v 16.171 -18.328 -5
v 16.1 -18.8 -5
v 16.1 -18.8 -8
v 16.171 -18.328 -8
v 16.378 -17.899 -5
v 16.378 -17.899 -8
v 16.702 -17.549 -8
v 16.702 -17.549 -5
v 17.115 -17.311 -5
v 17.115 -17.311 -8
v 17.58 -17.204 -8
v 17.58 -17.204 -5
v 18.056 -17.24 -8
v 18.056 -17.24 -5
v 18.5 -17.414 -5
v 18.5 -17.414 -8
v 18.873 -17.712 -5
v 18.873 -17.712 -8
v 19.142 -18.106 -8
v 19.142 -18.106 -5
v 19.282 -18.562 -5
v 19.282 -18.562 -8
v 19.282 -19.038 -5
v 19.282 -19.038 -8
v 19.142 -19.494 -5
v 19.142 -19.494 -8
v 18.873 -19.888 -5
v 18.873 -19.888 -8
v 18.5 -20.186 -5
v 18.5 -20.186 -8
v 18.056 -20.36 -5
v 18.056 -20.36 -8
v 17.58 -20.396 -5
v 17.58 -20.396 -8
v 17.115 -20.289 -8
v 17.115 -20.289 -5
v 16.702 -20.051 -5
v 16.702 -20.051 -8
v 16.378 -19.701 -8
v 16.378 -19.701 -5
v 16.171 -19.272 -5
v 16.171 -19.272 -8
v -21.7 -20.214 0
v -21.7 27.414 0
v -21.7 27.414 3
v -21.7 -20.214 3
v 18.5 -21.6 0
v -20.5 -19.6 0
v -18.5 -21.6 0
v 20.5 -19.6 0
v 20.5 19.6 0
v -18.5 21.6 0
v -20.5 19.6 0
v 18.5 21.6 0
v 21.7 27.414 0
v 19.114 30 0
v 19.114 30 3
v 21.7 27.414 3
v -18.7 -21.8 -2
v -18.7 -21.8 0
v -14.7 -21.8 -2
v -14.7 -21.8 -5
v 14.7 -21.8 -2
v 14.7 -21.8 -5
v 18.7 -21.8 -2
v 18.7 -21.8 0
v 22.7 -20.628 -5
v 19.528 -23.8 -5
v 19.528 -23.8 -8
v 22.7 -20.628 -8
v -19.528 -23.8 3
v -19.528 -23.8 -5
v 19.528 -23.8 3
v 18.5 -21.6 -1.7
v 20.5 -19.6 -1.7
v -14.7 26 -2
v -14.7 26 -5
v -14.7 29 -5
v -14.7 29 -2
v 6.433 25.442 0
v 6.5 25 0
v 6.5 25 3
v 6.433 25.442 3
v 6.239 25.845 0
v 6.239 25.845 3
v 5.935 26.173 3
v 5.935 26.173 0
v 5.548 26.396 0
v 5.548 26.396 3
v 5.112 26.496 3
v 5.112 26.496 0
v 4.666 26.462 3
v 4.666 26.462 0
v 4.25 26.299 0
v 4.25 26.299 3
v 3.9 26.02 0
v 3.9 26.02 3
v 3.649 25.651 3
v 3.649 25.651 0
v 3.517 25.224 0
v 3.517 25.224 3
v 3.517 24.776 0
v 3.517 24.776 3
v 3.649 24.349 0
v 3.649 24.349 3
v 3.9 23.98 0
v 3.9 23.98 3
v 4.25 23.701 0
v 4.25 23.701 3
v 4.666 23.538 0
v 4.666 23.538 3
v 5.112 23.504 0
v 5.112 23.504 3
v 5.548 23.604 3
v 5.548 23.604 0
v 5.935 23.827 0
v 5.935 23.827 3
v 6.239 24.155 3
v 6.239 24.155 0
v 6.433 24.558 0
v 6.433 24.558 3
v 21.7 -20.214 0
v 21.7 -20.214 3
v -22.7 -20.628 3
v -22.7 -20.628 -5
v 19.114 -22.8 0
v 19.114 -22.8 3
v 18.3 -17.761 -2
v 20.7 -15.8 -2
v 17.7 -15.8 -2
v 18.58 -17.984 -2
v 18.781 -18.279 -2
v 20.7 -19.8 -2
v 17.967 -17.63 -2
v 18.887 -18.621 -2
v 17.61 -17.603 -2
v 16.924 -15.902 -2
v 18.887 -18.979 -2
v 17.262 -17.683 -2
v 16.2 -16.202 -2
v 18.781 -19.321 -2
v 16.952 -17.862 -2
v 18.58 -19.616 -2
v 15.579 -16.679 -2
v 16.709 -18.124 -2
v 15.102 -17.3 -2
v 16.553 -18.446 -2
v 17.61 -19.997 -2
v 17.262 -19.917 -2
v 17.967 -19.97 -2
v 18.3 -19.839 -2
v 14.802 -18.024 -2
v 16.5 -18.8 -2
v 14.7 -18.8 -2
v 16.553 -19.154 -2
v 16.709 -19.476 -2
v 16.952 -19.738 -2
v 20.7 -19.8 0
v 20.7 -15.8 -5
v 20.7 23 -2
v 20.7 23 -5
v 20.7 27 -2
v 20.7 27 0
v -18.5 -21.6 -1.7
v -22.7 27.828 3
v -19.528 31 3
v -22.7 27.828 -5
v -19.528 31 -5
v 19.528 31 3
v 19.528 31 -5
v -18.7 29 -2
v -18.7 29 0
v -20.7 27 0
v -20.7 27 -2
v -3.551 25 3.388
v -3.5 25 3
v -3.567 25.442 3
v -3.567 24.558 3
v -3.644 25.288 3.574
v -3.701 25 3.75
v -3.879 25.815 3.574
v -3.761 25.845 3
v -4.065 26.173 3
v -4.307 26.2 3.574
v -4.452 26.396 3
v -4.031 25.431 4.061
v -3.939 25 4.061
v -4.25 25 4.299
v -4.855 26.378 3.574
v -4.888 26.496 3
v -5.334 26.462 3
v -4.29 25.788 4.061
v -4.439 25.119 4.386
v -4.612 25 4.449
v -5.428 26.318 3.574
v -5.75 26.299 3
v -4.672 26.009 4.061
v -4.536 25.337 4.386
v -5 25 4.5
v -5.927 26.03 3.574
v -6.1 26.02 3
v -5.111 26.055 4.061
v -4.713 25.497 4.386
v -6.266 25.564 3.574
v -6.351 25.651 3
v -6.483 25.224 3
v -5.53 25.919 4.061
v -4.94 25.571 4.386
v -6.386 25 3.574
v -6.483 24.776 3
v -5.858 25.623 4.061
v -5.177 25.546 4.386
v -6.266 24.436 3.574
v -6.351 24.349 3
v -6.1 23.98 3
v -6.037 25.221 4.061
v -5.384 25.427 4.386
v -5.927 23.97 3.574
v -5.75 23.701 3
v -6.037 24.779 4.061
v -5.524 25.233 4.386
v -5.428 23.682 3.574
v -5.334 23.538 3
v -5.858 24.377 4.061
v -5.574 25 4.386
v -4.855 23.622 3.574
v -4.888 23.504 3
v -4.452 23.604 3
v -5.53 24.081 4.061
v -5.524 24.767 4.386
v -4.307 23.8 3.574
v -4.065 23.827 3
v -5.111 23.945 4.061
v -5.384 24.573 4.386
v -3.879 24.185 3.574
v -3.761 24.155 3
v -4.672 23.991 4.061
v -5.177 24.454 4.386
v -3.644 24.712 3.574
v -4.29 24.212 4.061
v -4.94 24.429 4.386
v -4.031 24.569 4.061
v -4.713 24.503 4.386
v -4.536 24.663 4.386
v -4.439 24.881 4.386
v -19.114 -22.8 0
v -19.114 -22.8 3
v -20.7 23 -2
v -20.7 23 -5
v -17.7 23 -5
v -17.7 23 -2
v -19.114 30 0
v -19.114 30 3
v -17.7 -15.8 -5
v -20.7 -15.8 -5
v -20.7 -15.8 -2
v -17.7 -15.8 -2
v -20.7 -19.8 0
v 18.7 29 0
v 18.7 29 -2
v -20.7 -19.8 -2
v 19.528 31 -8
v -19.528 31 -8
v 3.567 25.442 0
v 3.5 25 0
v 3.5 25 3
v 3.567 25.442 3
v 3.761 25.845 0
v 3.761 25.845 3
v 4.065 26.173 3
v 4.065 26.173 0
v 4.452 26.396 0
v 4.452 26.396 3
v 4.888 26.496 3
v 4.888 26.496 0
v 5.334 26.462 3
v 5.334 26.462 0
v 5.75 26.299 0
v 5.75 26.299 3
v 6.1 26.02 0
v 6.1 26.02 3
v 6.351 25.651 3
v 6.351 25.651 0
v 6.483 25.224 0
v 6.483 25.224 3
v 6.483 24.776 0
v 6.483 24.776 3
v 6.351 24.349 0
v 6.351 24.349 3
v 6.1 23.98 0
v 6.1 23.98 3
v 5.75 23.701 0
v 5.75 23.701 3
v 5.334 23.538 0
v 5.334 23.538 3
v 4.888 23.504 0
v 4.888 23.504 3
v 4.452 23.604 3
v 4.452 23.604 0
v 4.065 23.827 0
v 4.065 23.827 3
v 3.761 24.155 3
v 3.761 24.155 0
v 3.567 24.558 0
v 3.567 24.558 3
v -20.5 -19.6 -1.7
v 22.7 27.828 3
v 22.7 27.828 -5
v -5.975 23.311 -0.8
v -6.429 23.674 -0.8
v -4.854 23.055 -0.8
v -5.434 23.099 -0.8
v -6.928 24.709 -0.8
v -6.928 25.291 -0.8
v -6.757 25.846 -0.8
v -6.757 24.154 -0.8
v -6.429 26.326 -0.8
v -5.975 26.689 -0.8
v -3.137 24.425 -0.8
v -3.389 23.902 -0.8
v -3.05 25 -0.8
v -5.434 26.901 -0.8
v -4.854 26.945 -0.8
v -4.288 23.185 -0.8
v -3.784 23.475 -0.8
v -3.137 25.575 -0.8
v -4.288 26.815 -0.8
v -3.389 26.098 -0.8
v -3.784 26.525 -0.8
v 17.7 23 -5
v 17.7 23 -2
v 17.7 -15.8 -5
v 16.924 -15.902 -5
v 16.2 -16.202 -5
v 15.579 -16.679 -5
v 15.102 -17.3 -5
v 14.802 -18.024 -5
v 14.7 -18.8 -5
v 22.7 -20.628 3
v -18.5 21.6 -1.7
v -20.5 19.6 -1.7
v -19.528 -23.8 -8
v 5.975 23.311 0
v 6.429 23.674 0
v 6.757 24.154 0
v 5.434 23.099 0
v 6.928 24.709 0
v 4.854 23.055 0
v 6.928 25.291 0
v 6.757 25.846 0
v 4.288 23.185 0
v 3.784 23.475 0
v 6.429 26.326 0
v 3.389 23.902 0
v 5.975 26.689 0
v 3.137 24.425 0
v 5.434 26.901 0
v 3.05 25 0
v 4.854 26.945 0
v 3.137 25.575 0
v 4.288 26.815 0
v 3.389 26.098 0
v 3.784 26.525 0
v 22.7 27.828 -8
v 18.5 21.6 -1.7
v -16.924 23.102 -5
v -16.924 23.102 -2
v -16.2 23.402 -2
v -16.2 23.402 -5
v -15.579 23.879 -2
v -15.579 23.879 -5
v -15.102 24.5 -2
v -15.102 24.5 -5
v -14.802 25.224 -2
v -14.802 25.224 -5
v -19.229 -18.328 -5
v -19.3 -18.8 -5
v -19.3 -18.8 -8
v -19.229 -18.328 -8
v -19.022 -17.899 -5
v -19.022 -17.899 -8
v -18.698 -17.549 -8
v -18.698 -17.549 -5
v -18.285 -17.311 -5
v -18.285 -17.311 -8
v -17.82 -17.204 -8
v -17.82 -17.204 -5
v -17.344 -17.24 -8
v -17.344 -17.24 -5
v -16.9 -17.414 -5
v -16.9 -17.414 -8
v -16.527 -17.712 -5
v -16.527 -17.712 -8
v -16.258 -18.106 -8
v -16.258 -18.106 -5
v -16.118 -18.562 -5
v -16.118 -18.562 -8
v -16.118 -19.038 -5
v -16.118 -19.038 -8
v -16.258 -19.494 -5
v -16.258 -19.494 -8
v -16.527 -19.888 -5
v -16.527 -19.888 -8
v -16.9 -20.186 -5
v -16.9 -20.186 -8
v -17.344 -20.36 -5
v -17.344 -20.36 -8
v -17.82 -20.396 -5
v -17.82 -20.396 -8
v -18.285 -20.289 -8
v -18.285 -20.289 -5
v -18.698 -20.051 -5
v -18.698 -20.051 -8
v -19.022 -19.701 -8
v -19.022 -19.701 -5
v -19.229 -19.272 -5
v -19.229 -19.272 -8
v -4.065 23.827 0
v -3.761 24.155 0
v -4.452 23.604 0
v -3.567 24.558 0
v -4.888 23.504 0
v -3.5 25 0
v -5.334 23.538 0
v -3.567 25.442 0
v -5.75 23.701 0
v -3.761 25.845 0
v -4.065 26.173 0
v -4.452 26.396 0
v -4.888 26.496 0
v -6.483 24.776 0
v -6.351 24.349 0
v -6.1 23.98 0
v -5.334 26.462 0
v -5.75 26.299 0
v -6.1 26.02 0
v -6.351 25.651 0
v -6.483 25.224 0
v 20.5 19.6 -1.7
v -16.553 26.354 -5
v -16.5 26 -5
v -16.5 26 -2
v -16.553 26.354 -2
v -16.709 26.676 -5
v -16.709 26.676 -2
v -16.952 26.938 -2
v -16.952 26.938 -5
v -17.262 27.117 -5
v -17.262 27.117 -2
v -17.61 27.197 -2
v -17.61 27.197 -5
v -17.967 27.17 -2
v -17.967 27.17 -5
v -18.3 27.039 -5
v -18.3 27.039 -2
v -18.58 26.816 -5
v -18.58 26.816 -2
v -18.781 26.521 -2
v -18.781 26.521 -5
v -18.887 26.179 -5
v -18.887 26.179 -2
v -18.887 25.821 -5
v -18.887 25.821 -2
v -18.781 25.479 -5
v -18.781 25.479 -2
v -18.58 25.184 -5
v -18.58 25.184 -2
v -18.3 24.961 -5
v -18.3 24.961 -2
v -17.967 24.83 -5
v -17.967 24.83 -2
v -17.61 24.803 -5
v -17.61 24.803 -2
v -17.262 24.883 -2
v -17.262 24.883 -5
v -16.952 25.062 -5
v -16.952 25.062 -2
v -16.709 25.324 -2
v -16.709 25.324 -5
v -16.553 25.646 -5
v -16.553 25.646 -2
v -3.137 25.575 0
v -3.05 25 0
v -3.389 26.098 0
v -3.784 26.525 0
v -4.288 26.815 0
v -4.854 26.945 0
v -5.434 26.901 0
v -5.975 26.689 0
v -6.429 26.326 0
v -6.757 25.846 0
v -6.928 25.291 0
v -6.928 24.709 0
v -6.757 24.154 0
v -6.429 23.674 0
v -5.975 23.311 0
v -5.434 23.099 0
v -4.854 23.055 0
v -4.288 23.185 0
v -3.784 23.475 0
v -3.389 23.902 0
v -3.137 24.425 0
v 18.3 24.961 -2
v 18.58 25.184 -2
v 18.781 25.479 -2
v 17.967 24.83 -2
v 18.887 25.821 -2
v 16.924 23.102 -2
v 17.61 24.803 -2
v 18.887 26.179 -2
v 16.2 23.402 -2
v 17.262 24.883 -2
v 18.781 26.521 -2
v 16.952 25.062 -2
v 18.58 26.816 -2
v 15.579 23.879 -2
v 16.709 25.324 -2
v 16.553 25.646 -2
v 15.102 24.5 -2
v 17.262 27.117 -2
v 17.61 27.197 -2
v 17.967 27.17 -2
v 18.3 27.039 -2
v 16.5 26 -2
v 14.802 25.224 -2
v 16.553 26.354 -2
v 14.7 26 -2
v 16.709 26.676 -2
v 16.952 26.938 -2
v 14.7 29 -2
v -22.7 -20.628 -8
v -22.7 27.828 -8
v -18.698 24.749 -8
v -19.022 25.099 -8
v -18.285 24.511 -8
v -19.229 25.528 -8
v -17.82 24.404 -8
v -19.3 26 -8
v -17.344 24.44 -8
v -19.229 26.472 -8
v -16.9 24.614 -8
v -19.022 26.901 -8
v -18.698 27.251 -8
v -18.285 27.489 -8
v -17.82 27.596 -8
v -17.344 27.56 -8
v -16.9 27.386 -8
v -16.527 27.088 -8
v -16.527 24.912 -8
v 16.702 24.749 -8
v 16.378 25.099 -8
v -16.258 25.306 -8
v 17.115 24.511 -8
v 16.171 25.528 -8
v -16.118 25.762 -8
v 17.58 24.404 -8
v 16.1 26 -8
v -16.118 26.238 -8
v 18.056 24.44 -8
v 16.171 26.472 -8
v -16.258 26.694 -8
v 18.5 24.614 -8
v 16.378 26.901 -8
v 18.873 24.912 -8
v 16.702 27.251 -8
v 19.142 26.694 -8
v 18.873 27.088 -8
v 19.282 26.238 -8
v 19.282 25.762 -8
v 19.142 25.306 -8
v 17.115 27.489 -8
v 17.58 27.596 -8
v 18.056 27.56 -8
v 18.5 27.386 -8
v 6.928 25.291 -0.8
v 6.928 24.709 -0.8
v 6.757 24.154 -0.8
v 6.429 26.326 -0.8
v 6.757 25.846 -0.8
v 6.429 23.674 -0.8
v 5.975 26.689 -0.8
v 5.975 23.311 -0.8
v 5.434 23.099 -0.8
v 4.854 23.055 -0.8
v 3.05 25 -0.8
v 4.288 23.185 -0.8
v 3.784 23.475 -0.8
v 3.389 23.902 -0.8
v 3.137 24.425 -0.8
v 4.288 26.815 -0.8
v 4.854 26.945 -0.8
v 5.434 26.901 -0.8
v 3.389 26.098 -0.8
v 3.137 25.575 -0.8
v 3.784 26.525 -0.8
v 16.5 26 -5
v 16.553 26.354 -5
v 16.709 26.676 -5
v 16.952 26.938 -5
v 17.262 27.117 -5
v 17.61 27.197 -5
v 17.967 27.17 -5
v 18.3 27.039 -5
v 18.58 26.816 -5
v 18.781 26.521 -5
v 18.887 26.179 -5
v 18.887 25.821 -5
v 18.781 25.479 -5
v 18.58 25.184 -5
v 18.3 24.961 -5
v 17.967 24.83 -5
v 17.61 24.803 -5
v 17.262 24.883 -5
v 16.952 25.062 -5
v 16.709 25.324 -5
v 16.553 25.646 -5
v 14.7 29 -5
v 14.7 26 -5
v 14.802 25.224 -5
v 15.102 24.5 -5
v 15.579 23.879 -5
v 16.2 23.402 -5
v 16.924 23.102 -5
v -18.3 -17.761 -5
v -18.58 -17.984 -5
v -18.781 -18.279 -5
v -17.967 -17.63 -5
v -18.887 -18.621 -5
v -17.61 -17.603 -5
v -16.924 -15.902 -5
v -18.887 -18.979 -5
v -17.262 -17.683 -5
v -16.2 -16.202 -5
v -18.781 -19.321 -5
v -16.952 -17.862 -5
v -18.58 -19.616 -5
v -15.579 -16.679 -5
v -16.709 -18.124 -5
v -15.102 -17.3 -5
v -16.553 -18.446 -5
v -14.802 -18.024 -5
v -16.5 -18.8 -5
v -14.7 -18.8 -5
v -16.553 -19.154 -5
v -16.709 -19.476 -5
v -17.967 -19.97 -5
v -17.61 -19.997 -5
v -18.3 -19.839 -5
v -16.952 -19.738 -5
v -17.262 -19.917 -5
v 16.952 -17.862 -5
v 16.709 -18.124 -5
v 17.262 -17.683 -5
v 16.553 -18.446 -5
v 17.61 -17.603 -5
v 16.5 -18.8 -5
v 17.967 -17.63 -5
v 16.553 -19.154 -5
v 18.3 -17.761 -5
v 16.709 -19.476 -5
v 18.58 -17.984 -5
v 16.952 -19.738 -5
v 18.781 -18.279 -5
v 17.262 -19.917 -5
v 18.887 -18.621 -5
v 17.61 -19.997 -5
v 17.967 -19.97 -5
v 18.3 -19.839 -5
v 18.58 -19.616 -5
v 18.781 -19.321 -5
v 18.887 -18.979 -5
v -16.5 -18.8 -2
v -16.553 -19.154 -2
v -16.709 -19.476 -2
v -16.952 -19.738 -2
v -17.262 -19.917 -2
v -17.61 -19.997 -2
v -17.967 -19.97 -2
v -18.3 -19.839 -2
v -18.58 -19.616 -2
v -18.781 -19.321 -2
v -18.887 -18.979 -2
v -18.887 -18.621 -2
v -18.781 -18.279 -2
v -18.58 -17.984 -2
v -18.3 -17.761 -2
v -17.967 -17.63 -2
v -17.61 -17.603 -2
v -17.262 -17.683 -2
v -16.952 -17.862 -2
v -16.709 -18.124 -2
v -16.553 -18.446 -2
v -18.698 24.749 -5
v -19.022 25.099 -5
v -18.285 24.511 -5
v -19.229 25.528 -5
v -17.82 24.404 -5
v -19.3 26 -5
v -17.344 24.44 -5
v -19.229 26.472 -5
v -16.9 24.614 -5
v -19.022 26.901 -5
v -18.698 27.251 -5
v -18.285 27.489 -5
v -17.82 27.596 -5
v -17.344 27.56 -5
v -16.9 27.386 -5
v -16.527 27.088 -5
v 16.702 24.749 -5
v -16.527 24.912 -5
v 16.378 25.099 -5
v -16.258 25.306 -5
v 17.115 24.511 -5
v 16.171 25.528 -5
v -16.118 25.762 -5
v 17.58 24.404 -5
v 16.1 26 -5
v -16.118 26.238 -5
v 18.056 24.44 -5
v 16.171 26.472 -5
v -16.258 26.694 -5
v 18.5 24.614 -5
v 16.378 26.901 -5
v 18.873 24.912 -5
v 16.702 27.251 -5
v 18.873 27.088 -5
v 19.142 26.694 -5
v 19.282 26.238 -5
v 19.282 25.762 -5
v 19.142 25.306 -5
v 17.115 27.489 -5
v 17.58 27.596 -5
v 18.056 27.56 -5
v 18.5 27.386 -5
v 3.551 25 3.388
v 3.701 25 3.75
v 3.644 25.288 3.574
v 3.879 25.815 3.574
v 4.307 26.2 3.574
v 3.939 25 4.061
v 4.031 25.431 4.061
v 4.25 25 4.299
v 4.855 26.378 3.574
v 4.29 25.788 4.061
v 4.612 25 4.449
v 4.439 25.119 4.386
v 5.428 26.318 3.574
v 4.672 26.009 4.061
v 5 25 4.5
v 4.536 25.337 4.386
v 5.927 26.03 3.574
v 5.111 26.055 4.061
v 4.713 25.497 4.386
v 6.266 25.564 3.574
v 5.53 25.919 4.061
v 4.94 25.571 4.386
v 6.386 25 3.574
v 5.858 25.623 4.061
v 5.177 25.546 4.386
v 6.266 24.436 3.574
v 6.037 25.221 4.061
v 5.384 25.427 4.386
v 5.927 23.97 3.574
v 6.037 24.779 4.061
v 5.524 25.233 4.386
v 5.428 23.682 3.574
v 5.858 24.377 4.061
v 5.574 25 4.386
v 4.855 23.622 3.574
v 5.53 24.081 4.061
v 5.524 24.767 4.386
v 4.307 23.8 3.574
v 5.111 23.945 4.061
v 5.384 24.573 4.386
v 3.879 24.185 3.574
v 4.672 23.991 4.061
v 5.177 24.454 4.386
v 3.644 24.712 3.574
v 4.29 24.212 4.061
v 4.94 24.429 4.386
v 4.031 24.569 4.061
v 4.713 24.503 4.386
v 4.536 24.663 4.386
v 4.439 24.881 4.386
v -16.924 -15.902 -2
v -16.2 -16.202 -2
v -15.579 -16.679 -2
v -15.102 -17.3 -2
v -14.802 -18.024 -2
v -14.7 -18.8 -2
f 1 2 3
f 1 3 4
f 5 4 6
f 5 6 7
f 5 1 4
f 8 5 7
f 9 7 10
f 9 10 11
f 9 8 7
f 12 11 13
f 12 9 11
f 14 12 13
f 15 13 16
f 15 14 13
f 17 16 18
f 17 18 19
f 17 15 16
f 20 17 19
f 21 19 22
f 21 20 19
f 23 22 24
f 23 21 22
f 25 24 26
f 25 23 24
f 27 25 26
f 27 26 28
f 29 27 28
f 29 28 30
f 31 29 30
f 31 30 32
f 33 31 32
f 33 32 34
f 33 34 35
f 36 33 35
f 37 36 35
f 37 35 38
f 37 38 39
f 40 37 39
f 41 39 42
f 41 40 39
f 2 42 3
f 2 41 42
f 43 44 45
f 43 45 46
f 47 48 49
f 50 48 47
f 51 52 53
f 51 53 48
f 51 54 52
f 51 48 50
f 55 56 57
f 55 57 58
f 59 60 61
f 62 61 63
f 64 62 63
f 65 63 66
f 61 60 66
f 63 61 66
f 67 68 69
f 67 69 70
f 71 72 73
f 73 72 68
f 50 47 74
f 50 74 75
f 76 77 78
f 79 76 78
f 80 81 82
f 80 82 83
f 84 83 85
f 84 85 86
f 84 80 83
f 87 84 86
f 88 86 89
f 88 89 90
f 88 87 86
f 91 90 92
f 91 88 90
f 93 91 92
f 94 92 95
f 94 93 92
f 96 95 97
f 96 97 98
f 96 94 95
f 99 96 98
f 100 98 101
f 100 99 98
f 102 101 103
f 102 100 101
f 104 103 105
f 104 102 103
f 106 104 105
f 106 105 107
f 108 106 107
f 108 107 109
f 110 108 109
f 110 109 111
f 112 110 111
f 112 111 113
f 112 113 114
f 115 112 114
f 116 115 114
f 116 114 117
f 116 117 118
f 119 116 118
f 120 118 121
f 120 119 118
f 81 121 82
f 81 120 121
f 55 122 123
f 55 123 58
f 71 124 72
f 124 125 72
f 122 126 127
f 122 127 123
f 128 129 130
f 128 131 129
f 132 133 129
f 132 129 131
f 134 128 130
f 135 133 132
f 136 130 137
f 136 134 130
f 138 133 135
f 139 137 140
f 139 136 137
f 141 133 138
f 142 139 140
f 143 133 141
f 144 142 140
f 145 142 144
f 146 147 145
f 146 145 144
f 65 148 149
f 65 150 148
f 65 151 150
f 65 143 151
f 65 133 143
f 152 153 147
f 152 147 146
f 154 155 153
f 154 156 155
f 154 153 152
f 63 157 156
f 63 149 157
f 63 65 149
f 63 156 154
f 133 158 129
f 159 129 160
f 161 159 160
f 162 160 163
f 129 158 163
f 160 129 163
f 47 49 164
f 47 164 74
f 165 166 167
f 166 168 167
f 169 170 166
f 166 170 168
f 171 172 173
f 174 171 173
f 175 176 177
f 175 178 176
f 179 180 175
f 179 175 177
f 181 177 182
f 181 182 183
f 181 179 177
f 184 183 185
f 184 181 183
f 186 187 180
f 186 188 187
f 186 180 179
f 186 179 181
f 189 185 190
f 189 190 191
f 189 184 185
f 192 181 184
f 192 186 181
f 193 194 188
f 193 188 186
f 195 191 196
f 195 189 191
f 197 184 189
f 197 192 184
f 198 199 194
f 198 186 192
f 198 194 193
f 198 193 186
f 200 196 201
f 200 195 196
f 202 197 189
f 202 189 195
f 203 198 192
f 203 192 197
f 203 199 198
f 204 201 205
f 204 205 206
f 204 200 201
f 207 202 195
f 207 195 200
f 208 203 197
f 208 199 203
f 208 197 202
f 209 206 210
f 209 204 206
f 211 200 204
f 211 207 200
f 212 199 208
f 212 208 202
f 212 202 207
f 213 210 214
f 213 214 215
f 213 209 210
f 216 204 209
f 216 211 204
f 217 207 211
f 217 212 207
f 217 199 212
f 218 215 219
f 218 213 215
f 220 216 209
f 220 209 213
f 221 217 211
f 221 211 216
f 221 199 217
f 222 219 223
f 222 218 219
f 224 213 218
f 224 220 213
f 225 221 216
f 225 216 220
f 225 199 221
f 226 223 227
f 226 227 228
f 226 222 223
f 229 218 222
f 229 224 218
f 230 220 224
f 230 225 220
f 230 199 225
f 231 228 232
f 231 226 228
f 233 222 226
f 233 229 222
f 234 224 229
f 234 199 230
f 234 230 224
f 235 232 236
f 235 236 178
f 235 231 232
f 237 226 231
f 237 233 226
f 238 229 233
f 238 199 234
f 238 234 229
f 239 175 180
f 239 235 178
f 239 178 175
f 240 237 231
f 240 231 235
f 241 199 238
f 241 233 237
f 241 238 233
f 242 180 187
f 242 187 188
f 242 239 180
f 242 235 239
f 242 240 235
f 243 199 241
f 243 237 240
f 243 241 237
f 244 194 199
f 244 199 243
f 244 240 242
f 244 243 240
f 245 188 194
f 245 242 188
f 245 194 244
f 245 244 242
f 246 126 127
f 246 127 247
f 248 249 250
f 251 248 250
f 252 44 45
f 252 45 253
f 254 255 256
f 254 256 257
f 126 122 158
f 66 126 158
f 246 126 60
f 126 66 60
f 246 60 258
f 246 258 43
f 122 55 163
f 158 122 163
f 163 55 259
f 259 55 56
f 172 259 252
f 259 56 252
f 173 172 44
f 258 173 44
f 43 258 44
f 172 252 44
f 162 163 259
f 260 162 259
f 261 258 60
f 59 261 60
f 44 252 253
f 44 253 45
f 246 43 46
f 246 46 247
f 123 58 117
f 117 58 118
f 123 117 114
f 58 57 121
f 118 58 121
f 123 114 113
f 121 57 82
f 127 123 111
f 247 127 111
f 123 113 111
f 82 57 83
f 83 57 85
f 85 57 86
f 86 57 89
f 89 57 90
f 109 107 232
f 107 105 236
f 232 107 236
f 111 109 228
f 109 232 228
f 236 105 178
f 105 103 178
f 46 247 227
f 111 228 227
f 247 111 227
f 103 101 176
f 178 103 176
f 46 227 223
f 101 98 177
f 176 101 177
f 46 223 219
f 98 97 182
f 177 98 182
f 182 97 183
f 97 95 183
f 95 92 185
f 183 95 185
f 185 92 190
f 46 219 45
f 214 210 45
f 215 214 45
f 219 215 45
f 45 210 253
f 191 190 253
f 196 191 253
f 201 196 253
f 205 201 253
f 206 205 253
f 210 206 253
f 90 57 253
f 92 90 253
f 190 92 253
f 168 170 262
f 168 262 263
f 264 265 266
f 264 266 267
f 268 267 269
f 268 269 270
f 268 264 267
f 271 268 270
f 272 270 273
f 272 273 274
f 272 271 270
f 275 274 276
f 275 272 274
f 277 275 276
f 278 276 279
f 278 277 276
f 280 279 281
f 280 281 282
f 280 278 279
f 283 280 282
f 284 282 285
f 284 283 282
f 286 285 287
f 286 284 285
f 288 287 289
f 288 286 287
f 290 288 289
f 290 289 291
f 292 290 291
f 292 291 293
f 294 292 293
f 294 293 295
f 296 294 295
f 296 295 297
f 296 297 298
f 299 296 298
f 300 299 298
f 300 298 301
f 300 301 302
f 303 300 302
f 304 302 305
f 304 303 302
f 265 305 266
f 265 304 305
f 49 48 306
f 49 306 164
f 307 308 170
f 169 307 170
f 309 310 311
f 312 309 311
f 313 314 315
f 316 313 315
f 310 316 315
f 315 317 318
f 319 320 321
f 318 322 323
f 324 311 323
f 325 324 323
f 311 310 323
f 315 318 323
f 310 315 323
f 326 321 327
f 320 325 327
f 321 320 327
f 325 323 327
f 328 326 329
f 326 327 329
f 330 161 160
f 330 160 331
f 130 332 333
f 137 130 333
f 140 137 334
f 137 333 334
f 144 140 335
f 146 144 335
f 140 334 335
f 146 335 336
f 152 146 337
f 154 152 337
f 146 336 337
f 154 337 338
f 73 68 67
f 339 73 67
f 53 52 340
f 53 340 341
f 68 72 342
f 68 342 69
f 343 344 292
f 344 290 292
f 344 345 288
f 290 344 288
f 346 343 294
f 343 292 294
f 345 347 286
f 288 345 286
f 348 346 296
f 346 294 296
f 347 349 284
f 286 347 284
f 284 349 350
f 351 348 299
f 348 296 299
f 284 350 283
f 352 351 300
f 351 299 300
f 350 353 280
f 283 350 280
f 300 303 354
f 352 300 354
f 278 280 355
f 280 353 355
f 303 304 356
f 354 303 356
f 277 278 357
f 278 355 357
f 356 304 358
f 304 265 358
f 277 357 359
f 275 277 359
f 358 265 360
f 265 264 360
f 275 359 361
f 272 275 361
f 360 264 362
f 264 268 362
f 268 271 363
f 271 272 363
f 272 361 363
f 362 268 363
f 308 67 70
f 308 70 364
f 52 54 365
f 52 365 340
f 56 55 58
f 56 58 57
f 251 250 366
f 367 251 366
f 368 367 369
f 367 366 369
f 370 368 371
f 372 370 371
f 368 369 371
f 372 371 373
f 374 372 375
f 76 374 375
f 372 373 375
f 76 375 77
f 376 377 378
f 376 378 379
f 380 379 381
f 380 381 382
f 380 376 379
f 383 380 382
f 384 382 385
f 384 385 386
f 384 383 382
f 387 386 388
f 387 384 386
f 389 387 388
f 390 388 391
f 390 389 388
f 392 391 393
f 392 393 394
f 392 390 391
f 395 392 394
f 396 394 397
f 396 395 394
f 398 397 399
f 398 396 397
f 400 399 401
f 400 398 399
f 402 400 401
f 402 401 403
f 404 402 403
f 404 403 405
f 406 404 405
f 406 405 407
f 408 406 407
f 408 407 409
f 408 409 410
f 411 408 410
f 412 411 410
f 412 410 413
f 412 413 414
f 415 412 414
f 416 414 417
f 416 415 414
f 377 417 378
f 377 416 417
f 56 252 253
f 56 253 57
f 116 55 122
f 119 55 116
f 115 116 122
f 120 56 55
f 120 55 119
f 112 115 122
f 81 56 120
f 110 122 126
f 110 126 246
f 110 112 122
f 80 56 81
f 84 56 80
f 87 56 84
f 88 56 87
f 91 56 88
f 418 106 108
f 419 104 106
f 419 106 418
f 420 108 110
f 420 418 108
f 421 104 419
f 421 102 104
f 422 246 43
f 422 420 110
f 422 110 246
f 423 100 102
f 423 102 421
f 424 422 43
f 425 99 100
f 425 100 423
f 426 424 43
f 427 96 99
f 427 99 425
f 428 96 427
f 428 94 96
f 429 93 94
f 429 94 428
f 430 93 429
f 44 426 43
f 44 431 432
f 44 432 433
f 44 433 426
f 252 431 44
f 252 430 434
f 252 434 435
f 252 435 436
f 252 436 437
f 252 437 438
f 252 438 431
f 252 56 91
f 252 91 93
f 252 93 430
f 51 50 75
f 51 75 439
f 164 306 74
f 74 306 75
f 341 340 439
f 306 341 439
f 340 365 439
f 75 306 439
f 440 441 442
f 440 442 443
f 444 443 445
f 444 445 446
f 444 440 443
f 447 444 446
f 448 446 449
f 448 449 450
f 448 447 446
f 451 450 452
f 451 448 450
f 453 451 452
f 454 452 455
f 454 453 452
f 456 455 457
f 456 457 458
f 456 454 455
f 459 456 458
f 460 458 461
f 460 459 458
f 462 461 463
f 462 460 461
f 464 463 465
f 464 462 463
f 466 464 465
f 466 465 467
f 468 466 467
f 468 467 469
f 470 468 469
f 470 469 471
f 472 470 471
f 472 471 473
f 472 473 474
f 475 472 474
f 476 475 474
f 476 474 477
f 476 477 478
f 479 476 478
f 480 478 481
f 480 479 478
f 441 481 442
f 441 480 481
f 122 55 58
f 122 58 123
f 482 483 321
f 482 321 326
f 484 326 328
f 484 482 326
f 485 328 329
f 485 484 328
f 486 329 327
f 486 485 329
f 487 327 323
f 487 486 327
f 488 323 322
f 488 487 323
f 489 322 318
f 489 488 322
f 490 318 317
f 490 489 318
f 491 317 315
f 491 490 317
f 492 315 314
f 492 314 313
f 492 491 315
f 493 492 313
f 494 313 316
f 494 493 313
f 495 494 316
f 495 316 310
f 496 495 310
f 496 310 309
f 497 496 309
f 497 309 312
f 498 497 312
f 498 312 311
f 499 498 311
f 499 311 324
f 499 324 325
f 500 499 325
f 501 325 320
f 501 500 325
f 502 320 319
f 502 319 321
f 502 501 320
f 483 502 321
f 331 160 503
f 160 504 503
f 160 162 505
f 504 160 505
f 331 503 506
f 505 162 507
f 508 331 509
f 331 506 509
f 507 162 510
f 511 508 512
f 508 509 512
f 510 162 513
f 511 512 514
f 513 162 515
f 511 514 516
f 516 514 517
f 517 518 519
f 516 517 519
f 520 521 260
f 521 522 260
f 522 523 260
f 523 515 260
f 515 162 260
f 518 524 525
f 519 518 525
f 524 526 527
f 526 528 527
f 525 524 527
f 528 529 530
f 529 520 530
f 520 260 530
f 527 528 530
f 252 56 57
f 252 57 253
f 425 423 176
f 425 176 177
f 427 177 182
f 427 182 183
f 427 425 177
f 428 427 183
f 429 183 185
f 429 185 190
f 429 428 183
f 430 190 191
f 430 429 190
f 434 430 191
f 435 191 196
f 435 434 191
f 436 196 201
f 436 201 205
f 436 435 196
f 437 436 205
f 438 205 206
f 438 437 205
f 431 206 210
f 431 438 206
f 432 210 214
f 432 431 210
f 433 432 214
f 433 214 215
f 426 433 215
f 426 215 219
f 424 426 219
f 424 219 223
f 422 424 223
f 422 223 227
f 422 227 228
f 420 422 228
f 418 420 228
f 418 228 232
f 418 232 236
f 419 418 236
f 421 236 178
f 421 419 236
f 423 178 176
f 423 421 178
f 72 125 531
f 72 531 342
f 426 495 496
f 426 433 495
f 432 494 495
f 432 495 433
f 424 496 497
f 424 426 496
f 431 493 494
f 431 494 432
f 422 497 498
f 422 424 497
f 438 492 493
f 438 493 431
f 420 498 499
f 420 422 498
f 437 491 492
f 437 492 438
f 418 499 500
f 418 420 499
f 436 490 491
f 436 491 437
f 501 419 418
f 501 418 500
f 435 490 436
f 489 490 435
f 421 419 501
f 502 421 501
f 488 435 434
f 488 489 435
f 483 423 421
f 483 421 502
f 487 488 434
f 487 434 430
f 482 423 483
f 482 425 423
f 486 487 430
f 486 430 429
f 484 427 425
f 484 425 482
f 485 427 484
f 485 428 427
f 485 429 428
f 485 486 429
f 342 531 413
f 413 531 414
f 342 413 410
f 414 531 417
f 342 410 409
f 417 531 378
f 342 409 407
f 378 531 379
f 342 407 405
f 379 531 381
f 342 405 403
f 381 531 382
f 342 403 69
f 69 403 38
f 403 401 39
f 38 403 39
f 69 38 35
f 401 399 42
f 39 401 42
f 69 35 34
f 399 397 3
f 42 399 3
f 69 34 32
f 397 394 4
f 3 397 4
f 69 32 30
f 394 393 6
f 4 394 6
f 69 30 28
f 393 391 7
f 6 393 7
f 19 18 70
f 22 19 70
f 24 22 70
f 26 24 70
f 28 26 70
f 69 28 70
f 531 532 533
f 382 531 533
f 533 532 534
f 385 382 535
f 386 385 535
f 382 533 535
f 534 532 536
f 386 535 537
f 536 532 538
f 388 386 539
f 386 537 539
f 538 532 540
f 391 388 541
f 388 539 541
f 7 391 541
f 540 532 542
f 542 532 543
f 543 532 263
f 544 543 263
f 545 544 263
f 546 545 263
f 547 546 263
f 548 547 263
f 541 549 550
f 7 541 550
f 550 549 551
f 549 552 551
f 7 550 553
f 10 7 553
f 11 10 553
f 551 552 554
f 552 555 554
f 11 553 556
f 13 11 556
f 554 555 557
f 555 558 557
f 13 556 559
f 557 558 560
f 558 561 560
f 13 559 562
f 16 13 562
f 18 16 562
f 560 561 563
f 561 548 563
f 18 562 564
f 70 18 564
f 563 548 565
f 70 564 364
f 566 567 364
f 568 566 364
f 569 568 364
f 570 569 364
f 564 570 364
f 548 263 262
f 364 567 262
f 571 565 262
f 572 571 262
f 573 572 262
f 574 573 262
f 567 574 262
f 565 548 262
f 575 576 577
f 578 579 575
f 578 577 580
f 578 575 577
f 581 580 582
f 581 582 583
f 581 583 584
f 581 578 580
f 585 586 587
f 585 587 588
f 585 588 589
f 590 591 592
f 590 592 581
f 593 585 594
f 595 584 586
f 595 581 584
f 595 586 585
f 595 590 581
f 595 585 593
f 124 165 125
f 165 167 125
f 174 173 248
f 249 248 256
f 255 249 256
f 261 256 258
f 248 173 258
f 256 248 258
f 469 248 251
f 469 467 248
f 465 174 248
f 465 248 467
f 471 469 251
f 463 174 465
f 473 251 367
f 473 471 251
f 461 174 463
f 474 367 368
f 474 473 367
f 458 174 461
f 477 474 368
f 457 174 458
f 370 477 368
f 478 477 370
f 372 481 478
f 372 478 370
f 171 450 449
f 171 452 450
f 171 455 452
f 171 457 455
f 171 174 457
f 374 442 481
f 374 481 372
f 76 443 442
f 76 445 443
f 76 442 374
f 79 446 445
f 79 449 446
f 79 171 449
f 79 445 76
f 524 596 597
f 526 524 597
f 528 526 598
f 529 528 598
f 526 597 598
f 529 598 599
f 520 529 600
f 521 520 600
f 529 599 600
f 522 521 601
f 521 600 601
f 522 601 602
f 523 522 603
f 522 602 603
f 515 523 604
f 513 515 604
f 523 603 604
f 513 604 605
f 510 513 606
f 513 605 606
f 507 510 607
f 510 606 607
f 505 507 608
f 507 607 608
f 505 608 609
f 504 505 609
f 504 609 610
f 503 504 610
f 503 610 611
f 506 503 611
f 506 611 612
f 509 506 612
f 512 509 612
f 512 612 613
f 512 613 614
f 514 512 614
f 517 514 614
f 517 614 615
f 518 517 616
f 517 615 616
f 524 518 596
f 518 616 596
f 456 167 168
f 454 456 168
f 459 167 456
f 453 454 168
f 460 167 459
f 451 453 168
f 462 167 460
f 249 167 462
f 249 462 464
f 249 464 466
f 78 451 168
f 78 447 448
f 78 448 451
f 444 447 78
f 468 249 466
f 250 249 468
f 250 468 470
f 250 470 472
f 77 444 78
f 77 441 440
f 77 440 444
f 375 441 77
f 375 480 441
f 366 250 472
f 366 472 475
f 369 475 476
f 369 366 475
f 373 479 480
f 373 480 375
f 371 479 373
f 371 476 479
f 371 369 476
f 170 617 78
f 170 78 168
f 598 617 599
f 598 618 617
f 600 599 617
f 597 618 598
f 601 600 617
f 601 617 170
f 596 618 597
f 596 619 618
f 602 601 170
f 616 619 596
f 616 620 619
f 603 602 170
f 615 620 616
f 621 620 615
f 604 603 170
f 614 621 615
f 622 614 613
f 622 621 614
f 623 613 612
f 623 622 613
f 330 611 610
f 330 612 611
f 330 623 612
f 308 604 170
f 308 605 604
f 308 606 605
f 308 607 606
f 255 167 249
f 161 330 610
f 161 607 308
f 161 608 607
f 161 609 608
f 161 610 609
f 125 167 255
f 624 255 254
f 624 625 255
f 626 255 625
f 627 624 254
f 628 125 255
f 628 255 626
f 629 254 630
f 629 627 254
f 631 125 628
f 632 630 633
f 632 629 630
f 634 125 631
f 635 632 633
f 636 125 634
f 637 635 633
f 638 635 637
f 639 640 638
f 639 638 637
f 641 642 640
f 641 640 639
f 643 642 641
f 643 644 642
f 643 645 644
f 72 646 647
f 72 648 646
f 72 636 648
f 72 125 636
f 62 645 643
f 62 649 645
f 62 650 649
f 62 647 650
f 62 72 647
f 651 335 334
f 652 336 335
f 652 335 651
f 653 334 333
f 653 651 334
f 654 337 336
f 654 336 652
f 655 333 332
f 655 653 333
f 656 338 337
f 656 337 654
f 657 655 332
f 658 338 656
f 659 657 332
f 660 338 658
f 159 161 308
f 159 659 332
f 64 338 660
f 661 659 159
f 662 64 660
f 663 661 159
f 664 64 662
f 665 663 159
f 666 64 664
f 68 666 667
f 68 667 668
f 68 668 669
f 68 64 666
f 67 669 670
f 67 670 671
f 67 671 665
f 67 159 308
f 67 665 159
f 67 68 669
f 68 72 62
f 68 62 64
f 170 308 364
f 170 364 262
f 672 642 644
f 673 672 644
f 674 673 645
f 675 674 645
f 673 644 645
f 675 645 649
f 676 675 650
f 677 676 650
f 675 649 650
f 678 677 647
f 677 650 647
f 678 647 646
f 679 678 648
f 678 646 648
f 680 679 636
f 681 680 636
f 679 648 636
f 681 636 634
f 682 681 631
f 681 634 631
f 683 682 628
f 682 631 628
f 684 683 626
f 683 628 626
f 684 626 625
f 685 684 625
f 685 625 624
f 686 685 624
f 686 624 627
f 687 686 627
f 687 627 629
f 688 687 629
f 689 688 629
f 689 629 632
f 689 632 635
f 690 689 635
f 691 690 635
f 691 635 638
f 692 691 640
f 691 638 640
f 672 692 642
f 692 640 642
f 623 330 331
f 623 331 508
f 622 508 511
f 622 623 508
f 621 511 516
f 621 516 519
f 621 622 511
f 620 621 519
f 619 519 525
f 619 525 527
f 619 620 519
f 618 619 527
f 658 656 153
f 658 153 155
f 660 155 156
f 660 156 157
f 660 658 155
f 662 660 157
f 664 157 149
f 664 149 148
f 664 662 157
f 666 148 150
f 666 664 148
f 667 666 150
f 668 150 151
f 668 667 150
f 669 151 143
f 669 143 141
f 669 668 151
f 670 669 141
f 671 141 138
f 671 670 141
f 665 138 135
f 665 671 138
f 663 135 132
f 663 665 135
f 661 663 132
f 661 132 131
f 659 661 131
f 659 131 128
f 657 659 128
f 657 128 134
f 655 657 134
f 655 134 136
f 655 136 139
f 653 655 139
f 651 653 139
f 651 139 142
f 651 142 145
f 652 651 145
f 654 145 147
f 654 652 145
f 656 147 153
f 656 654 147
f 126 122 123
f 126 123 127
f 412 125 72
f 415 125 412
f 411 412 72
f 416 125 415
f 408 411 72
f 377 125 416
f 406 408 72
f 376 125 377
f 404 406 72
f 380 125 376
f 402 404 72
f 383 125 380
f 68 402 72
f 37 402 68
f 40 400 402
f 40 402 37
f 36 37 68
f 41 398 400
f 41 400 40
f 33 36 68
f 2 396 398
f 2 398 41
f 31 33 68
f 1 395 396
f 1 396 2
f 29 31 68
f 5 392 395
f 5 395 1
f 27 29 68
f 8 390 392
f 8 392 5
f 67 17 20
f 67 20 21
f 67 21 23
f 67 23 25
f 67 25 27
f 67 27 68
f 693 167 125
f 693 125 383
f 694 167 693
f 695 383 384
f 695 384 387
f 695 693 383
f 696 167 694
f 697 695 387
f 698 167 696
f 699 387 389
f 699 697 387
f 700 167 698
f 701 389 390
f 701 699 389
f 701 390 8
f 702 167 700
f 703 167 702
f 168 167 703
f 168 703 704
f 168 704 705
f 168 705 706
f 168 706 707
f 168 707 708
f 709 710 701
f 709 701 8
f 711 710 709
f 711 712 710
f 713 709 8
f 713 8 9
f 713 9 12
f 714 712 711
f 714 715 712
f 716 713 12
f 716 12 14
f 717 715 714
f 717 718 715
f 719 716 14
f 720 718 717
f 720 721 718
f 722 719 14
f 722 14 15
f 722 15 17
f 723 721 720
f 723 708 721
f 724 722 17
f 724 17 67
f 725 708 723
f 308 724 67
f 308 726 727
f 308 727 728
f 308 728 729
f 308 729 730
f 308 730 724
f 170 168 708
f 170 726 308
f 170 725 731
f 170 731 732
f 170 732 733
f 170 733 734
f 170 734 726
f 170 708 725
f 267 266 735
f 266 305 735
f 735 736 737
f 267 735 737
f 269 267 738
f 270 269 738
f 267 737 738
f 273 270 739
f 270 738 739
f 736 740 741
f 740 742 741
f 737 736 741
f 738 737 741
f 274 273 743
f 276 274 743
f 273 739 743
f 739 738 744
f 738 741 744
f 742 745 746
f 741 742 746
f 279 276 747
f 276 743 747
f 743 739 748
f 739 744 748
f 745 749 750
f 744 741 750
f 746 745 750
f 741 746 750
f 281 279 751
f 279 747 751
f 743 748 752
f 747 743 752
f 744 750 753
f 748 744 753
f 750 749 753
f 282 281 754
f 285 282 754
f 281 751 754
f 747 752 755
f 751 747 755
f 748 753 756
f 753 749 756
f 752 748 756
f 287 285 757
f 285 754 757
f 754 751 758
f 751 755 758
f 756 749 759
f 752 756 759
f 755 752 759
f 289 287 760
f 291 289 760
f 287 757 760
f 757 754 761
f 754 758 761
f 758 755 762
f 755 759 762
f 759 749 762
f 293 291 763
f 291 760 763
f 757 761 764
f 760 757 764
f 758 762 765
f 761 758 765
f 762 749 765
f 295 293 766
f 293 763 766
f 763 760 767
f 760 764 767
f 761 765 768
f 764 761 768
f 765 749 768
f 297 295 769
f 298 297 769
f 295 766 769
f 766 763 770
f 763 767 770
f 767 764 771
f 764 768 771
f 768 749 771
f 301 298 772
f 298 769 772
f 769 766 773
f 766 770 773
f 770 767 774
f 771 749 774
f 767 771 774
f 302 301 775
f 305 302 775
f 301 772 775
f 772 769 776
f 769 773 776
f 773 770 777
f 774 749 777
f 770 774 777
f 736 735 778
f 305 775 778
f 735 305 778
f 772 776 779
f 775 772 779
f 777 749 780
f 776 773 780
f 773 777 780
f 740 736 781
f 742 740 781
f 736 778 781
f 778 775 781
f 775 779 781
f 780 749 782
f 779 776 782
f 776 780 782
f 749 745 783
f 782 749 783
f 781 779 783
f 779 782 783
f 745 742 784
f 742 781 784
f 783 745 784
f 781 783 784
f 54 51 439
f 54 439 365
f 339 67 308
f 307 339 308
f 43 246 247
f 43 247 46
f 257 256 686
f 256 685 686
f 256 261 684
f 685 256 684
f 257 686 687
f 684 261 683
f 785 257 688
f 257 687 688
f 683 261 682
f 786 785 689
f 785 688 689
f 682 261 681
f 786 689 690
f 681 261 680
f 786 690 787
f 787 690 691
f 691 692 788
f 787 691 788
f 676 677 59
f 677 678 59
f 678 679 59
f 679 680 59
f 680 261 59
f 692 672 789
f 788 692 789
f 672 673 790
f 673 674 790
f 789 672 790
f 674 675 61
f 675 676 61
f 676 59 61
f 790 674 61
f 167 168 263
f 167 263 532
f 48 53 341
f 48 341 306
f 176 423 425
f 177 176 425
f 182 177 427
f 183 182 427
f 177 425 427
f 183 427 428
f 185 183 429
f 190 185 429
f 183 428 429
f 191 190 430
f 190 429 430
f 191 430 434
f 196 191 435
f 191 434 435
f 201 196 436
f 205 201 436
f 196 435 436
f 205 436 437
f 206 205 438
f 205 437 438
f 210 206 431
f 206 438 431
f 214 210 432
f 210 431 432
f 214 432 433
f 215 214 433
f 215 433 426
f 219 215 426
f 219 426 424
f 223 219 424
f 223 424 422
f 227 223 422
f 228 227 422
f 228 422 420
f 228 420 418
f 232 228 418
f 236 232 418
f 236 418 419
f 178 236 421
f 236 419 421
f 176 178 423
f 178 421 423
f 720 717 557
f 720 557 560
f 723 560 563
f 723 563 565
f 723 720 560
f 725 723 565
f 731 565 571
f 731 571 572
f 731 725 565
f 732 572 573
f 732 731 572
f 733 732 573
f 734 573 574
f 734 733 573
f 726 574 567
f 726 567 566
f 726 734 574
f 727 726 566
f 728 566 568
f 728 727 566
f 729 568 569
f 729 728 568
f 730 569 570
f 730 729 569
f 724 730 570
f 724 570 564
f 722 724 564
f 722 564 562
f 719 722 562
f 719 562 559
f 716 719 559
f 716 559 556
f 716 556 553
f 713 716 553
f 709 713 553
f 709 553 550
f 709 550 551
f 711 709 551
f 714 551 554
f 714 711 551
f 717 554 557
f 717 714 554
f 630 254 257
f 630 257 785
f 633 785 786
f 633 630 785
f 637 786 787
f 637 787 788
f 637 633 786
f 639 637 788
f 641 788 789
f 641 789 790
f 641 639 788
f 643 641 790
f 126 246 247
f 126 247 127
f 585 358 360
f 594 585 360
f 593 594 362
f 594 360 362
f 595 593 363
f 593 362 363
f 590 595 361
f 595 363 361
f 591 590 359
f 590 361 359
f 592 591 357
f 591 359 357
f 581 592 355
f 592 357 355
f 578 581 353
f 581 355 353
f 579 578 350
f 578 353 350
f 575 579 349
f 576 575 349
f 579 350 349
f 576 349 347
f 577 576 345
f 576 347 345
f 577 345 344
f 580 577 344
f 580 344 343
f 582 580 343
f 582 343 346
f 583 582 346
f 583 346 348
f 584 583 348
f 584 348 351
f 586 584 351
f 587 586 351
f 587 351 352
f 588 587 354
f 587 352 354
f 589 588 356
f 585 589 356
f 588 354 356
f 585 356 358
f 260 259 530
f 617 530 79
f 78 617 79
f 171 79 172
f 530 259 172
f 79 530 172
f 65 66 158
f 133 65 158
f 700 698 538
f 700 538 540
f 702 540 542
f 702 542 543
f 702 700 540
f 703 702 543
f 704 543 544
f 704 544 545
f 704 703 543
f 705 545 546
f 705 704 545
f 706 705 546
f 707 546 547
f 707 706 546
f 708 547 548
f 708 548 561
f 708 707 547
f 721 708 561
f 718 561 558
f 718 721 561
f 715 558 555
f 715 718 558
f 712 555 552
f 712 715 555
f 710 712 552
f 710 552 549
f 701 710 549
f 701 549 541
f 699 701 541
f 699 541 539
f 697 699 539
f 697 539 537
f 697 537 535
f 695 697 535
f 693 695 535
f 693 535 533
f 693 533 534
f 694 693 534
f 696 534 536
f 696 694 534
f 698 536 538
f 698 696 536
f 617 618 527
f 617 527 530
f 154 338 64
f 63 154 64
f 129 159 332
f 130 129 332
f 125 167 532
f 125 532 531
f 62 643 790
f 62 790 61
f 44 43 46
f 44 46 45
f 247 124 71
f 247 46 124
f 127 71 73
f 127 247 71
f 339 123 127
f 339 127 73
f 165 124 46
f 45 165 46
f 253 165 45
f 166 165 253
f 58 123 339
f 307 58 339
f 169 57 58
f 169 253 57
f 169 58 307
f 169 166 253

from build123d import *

# Parameters (mm, degrees)
BOSS_EXTRUDE1_DEPTH     = 1.7
SKETCH2_R               = 1.95
BOSS_EXTRUDE2_DEPTH     = 0.8
SKETCH4_R               = 1.5
BOSS_EXTRUDE3_DEPTH     = 4.5
FILLET1_R               = 1.5
BOSS_EXTRUDE4_DEPTH     = 5
BOSS_EXTRUDE5_DEPTH     = 3
SKETCH8_R               = 1.2
BOSS_EXTRUDE6_DEPTH     = 3
MIRROR2_COPY_1_SKETCH_R = 1.2
MIRROR2_COPY_1_DEPTH    = 3
SKETCH9_R               = 1.5
FRONT_DEPTH             = 3
SKETCH10_R              = 1.6
BACK_DEPTH              = 3


with BuildPart() as part:
    # Sketch1 → Boss-Extrude1 (new body)
    with BuildSketch(Plane.XY):
        Polygon((-18.5, 21.6), (-20.5, 19.6), (-20.5, -19.6), (-18.5, -21.6), (18.5, -21.6), (20.5, -19.6), (20.5, 19.6), (18.5, 21.6), align=None)
    extrude(amount=-BOSS_EXTRUDE1_DEPTH)


with BuildPart() as body_2:
    # Sketch2 → Boss-Extrude2 (new body)
    with BuildSketch(Plane.XY):
        with Locations((-5, 25)):
            Circle(SKETCH2_R)
    extrude(amount=-BOSS_EXTRUDE2_DEPTH)

    # Sketch4 → Boss-Extrude3 (add)
    with BuildSketch(Plane.XY):
        with Locations((-5, 25)):
            Circle(SKETCH4_R)
    extrude(amount=BOSS_EXTRUDE3_DEPTH)

    # Fillet1
    fillet1_edges = [body_2.edges().sort_by_distance(p)[0] for p in [
        (-6.5, 25, 4.5),
    ]]
    fillet(fillet1_edges, radius=FILLET1_R)


with BuildPart() as body_3:
    # LED green: mirrored copy
    add(body_2.part.mirror(Plane(origin=(0, 0, 0), x_dir=(0, 0, 1), z_dir=(1, 0, 0))))


with BuildPart() as body_4:
    # Sketch6 → Boss-Extrude4 (new body)
    with BuildSketch(Plane.XY):
        Polygon((-19.528427125, 31), (19.528427125, 31), (22.7, 27.828427125), (22.7, -20.628427125), (19.528427125, -23.8), (-19.528427125, -23.8), (-22.7, -20.628427125), (-22.7, 27.828427125), align=None)
        Polygon((-18.7, -21.8), (18.7, -21.8), (20.7, -19.8), (20.7, 27), (18.7, 29), (-18.7, 29), (-20.7, 27), (-20.7, -19.8), align=None, mode=Mode.SUBTRACT)
    extrude(amount=-BOSS_EXTRUDE4_DEPTH)

    # Sketch7 → Boss-Extrude5 (add)
    with BuildSketch(Plane.XY):
        Polygon((22.7, 27.828427125), (19.528427125, 31), (-19.528427125, 31), (-22.7, 27.828427125), (-22.7, -20.628427125), (-19.528427125, -23.8), (19.528427125, -23.8), (22.7, -20.628427125), align=None)
        Polygon((21.7, 27.414213562), (19.114213562, 30), (-19.114213562, 30), (-21.7, 27.414213562), (-21.7, -20.214213562), (-19.114213562, -22.8), (19.114213562, -22.8), (21.7, -20.214213562), align=None, mode=Mode.SUBTRACT)
    extrude(amount=BOSS_EXTRUDE5_DEPTH)

    # Sketch8 → Boss-Extrude6 (add)
    with BuildSketch(Plane(origin=(0, 0, -5), x_dir=(-1, 0, 0), z_dir=(0, 0, -1))):
        with BuildLine():
            Line((-14.7, 29), (-18.7, 29))
            Line((-18.7, 29), (-20.7, 27))
            Line((-20.7, 27), (-20.7, 23))
            Line((-20.7, 23), (-17.7, 23))
            ThreePointArc((-17.7, 23), (-15.578679656, 23.878679656), (-14.7, 26))
            Line((-14.7, 26), (-14.7, 29))
        make_face()
        with Locations((-17.7, 26)):
            Circle(SKETCH8_R, mode=Mode.SUBTRACT)
    boss_extrude6 = extrude(amount=-BOSS_EXTRUDE6_DEPTH)

    # Mirror1: Boss-Extrude6 across plane
    add(boss_extrude6.mirror(Plane(origin=(0, 0, 0), x_dir=(0, 0, 1), z_dir=(1, 0, 0))))

    # Mirror2: Boss-Extrude6 across plane
    add(boss_extrude6.mirror(Plane.ZX.offset(3.6)))

    # Mirror2 copy 1 sketch → Mirror2 copy 1 (add)
    with BuildSketch(Plane(origin=(0, 7.2, -5), x_dir=(1, 0, 0), z_dir=(0, 0, -1))):
        with BuildLine():
            Line((-14.7, 29), (-18.7, 29))
            Line((-18.7, 29), (-20.7, 27))
            Line((-20.7, 27), (-20.7, 23))
            Line((-20.7, 23), (-17.7, 23))
            ThreePointArc((-17.7, 23), (-15.578679656, 23.878679656), (-14.7, 26))
            Line((-14.7, 26), (-14.7, 29))
        make_face()
        with Locations((-17.7, 26)):
            Circle(MIRROR2_COPY_1_SKETCH_R, mode=Mode.SUBTRACT)
    extrude(amount=-MIRROR2_COPY_1_DEPTH)


with BuildPart() as body_5:
    # Sketch9 → Front (new body)
    with BuildSketch(Plane.XY):
        Polygon((-21.7, 27.414213562), (-19.114213562, 30), (19.114213562, 30), (21.7, 27.414213562), (21.7, -20.214213562), (19.114213562, -22.8), (-19.114213562, -22.8), (-21.7, -20.214213562), align=None)
        with Locations((-5, 25)):
            Circle(SKETCH9_R, mode=Mode.SUBTRACT)
        with Locations((5, 25)):
            Circle(SKETCH9_R, mode=Mode.SUBTRACT)
    extrude(amount=FRONT_DEPTH)


with BuildPart() as body_6:
    # Sketch10 → Back (new body)
    with BuildSketch(Plane(origin=(0, 0, -5), x_dir=(-1, 0, 0), z_dir=(0, 0, -1))):
        Polygon((-22.7, 27.828427125), (-19.528427125, 31), (19.528427125, 31), (22.7, 27.828427125), (22.7, -20.628427125), (19.528427125, -23.8), (-19.528427125, -23.8), (-22.7, -20.628427125), align=None)
        with Locations((-17.7, 26)):
            Circle(SKETCH10_R, mode=Mode.SUBTRACT)
        with Locations((17.7, 26)):
            Circle(SKETCH10_R, mode=Mode.SUBTRACT)
        with Locations((17.7, -18.8)):
            Circle(SKETCH10_R, mode=Mode.SUBTRACT)
        with Locations((-17.7, -18.8)):
            Circle(SKETCH10_R, mode=Mode.SUBTRACT)
    extrude(amount=BACK_DEPTH)


solid = Compound([part.part, body_2.part, body_3.part, body_4.part, body_5.part, body_6.part])
